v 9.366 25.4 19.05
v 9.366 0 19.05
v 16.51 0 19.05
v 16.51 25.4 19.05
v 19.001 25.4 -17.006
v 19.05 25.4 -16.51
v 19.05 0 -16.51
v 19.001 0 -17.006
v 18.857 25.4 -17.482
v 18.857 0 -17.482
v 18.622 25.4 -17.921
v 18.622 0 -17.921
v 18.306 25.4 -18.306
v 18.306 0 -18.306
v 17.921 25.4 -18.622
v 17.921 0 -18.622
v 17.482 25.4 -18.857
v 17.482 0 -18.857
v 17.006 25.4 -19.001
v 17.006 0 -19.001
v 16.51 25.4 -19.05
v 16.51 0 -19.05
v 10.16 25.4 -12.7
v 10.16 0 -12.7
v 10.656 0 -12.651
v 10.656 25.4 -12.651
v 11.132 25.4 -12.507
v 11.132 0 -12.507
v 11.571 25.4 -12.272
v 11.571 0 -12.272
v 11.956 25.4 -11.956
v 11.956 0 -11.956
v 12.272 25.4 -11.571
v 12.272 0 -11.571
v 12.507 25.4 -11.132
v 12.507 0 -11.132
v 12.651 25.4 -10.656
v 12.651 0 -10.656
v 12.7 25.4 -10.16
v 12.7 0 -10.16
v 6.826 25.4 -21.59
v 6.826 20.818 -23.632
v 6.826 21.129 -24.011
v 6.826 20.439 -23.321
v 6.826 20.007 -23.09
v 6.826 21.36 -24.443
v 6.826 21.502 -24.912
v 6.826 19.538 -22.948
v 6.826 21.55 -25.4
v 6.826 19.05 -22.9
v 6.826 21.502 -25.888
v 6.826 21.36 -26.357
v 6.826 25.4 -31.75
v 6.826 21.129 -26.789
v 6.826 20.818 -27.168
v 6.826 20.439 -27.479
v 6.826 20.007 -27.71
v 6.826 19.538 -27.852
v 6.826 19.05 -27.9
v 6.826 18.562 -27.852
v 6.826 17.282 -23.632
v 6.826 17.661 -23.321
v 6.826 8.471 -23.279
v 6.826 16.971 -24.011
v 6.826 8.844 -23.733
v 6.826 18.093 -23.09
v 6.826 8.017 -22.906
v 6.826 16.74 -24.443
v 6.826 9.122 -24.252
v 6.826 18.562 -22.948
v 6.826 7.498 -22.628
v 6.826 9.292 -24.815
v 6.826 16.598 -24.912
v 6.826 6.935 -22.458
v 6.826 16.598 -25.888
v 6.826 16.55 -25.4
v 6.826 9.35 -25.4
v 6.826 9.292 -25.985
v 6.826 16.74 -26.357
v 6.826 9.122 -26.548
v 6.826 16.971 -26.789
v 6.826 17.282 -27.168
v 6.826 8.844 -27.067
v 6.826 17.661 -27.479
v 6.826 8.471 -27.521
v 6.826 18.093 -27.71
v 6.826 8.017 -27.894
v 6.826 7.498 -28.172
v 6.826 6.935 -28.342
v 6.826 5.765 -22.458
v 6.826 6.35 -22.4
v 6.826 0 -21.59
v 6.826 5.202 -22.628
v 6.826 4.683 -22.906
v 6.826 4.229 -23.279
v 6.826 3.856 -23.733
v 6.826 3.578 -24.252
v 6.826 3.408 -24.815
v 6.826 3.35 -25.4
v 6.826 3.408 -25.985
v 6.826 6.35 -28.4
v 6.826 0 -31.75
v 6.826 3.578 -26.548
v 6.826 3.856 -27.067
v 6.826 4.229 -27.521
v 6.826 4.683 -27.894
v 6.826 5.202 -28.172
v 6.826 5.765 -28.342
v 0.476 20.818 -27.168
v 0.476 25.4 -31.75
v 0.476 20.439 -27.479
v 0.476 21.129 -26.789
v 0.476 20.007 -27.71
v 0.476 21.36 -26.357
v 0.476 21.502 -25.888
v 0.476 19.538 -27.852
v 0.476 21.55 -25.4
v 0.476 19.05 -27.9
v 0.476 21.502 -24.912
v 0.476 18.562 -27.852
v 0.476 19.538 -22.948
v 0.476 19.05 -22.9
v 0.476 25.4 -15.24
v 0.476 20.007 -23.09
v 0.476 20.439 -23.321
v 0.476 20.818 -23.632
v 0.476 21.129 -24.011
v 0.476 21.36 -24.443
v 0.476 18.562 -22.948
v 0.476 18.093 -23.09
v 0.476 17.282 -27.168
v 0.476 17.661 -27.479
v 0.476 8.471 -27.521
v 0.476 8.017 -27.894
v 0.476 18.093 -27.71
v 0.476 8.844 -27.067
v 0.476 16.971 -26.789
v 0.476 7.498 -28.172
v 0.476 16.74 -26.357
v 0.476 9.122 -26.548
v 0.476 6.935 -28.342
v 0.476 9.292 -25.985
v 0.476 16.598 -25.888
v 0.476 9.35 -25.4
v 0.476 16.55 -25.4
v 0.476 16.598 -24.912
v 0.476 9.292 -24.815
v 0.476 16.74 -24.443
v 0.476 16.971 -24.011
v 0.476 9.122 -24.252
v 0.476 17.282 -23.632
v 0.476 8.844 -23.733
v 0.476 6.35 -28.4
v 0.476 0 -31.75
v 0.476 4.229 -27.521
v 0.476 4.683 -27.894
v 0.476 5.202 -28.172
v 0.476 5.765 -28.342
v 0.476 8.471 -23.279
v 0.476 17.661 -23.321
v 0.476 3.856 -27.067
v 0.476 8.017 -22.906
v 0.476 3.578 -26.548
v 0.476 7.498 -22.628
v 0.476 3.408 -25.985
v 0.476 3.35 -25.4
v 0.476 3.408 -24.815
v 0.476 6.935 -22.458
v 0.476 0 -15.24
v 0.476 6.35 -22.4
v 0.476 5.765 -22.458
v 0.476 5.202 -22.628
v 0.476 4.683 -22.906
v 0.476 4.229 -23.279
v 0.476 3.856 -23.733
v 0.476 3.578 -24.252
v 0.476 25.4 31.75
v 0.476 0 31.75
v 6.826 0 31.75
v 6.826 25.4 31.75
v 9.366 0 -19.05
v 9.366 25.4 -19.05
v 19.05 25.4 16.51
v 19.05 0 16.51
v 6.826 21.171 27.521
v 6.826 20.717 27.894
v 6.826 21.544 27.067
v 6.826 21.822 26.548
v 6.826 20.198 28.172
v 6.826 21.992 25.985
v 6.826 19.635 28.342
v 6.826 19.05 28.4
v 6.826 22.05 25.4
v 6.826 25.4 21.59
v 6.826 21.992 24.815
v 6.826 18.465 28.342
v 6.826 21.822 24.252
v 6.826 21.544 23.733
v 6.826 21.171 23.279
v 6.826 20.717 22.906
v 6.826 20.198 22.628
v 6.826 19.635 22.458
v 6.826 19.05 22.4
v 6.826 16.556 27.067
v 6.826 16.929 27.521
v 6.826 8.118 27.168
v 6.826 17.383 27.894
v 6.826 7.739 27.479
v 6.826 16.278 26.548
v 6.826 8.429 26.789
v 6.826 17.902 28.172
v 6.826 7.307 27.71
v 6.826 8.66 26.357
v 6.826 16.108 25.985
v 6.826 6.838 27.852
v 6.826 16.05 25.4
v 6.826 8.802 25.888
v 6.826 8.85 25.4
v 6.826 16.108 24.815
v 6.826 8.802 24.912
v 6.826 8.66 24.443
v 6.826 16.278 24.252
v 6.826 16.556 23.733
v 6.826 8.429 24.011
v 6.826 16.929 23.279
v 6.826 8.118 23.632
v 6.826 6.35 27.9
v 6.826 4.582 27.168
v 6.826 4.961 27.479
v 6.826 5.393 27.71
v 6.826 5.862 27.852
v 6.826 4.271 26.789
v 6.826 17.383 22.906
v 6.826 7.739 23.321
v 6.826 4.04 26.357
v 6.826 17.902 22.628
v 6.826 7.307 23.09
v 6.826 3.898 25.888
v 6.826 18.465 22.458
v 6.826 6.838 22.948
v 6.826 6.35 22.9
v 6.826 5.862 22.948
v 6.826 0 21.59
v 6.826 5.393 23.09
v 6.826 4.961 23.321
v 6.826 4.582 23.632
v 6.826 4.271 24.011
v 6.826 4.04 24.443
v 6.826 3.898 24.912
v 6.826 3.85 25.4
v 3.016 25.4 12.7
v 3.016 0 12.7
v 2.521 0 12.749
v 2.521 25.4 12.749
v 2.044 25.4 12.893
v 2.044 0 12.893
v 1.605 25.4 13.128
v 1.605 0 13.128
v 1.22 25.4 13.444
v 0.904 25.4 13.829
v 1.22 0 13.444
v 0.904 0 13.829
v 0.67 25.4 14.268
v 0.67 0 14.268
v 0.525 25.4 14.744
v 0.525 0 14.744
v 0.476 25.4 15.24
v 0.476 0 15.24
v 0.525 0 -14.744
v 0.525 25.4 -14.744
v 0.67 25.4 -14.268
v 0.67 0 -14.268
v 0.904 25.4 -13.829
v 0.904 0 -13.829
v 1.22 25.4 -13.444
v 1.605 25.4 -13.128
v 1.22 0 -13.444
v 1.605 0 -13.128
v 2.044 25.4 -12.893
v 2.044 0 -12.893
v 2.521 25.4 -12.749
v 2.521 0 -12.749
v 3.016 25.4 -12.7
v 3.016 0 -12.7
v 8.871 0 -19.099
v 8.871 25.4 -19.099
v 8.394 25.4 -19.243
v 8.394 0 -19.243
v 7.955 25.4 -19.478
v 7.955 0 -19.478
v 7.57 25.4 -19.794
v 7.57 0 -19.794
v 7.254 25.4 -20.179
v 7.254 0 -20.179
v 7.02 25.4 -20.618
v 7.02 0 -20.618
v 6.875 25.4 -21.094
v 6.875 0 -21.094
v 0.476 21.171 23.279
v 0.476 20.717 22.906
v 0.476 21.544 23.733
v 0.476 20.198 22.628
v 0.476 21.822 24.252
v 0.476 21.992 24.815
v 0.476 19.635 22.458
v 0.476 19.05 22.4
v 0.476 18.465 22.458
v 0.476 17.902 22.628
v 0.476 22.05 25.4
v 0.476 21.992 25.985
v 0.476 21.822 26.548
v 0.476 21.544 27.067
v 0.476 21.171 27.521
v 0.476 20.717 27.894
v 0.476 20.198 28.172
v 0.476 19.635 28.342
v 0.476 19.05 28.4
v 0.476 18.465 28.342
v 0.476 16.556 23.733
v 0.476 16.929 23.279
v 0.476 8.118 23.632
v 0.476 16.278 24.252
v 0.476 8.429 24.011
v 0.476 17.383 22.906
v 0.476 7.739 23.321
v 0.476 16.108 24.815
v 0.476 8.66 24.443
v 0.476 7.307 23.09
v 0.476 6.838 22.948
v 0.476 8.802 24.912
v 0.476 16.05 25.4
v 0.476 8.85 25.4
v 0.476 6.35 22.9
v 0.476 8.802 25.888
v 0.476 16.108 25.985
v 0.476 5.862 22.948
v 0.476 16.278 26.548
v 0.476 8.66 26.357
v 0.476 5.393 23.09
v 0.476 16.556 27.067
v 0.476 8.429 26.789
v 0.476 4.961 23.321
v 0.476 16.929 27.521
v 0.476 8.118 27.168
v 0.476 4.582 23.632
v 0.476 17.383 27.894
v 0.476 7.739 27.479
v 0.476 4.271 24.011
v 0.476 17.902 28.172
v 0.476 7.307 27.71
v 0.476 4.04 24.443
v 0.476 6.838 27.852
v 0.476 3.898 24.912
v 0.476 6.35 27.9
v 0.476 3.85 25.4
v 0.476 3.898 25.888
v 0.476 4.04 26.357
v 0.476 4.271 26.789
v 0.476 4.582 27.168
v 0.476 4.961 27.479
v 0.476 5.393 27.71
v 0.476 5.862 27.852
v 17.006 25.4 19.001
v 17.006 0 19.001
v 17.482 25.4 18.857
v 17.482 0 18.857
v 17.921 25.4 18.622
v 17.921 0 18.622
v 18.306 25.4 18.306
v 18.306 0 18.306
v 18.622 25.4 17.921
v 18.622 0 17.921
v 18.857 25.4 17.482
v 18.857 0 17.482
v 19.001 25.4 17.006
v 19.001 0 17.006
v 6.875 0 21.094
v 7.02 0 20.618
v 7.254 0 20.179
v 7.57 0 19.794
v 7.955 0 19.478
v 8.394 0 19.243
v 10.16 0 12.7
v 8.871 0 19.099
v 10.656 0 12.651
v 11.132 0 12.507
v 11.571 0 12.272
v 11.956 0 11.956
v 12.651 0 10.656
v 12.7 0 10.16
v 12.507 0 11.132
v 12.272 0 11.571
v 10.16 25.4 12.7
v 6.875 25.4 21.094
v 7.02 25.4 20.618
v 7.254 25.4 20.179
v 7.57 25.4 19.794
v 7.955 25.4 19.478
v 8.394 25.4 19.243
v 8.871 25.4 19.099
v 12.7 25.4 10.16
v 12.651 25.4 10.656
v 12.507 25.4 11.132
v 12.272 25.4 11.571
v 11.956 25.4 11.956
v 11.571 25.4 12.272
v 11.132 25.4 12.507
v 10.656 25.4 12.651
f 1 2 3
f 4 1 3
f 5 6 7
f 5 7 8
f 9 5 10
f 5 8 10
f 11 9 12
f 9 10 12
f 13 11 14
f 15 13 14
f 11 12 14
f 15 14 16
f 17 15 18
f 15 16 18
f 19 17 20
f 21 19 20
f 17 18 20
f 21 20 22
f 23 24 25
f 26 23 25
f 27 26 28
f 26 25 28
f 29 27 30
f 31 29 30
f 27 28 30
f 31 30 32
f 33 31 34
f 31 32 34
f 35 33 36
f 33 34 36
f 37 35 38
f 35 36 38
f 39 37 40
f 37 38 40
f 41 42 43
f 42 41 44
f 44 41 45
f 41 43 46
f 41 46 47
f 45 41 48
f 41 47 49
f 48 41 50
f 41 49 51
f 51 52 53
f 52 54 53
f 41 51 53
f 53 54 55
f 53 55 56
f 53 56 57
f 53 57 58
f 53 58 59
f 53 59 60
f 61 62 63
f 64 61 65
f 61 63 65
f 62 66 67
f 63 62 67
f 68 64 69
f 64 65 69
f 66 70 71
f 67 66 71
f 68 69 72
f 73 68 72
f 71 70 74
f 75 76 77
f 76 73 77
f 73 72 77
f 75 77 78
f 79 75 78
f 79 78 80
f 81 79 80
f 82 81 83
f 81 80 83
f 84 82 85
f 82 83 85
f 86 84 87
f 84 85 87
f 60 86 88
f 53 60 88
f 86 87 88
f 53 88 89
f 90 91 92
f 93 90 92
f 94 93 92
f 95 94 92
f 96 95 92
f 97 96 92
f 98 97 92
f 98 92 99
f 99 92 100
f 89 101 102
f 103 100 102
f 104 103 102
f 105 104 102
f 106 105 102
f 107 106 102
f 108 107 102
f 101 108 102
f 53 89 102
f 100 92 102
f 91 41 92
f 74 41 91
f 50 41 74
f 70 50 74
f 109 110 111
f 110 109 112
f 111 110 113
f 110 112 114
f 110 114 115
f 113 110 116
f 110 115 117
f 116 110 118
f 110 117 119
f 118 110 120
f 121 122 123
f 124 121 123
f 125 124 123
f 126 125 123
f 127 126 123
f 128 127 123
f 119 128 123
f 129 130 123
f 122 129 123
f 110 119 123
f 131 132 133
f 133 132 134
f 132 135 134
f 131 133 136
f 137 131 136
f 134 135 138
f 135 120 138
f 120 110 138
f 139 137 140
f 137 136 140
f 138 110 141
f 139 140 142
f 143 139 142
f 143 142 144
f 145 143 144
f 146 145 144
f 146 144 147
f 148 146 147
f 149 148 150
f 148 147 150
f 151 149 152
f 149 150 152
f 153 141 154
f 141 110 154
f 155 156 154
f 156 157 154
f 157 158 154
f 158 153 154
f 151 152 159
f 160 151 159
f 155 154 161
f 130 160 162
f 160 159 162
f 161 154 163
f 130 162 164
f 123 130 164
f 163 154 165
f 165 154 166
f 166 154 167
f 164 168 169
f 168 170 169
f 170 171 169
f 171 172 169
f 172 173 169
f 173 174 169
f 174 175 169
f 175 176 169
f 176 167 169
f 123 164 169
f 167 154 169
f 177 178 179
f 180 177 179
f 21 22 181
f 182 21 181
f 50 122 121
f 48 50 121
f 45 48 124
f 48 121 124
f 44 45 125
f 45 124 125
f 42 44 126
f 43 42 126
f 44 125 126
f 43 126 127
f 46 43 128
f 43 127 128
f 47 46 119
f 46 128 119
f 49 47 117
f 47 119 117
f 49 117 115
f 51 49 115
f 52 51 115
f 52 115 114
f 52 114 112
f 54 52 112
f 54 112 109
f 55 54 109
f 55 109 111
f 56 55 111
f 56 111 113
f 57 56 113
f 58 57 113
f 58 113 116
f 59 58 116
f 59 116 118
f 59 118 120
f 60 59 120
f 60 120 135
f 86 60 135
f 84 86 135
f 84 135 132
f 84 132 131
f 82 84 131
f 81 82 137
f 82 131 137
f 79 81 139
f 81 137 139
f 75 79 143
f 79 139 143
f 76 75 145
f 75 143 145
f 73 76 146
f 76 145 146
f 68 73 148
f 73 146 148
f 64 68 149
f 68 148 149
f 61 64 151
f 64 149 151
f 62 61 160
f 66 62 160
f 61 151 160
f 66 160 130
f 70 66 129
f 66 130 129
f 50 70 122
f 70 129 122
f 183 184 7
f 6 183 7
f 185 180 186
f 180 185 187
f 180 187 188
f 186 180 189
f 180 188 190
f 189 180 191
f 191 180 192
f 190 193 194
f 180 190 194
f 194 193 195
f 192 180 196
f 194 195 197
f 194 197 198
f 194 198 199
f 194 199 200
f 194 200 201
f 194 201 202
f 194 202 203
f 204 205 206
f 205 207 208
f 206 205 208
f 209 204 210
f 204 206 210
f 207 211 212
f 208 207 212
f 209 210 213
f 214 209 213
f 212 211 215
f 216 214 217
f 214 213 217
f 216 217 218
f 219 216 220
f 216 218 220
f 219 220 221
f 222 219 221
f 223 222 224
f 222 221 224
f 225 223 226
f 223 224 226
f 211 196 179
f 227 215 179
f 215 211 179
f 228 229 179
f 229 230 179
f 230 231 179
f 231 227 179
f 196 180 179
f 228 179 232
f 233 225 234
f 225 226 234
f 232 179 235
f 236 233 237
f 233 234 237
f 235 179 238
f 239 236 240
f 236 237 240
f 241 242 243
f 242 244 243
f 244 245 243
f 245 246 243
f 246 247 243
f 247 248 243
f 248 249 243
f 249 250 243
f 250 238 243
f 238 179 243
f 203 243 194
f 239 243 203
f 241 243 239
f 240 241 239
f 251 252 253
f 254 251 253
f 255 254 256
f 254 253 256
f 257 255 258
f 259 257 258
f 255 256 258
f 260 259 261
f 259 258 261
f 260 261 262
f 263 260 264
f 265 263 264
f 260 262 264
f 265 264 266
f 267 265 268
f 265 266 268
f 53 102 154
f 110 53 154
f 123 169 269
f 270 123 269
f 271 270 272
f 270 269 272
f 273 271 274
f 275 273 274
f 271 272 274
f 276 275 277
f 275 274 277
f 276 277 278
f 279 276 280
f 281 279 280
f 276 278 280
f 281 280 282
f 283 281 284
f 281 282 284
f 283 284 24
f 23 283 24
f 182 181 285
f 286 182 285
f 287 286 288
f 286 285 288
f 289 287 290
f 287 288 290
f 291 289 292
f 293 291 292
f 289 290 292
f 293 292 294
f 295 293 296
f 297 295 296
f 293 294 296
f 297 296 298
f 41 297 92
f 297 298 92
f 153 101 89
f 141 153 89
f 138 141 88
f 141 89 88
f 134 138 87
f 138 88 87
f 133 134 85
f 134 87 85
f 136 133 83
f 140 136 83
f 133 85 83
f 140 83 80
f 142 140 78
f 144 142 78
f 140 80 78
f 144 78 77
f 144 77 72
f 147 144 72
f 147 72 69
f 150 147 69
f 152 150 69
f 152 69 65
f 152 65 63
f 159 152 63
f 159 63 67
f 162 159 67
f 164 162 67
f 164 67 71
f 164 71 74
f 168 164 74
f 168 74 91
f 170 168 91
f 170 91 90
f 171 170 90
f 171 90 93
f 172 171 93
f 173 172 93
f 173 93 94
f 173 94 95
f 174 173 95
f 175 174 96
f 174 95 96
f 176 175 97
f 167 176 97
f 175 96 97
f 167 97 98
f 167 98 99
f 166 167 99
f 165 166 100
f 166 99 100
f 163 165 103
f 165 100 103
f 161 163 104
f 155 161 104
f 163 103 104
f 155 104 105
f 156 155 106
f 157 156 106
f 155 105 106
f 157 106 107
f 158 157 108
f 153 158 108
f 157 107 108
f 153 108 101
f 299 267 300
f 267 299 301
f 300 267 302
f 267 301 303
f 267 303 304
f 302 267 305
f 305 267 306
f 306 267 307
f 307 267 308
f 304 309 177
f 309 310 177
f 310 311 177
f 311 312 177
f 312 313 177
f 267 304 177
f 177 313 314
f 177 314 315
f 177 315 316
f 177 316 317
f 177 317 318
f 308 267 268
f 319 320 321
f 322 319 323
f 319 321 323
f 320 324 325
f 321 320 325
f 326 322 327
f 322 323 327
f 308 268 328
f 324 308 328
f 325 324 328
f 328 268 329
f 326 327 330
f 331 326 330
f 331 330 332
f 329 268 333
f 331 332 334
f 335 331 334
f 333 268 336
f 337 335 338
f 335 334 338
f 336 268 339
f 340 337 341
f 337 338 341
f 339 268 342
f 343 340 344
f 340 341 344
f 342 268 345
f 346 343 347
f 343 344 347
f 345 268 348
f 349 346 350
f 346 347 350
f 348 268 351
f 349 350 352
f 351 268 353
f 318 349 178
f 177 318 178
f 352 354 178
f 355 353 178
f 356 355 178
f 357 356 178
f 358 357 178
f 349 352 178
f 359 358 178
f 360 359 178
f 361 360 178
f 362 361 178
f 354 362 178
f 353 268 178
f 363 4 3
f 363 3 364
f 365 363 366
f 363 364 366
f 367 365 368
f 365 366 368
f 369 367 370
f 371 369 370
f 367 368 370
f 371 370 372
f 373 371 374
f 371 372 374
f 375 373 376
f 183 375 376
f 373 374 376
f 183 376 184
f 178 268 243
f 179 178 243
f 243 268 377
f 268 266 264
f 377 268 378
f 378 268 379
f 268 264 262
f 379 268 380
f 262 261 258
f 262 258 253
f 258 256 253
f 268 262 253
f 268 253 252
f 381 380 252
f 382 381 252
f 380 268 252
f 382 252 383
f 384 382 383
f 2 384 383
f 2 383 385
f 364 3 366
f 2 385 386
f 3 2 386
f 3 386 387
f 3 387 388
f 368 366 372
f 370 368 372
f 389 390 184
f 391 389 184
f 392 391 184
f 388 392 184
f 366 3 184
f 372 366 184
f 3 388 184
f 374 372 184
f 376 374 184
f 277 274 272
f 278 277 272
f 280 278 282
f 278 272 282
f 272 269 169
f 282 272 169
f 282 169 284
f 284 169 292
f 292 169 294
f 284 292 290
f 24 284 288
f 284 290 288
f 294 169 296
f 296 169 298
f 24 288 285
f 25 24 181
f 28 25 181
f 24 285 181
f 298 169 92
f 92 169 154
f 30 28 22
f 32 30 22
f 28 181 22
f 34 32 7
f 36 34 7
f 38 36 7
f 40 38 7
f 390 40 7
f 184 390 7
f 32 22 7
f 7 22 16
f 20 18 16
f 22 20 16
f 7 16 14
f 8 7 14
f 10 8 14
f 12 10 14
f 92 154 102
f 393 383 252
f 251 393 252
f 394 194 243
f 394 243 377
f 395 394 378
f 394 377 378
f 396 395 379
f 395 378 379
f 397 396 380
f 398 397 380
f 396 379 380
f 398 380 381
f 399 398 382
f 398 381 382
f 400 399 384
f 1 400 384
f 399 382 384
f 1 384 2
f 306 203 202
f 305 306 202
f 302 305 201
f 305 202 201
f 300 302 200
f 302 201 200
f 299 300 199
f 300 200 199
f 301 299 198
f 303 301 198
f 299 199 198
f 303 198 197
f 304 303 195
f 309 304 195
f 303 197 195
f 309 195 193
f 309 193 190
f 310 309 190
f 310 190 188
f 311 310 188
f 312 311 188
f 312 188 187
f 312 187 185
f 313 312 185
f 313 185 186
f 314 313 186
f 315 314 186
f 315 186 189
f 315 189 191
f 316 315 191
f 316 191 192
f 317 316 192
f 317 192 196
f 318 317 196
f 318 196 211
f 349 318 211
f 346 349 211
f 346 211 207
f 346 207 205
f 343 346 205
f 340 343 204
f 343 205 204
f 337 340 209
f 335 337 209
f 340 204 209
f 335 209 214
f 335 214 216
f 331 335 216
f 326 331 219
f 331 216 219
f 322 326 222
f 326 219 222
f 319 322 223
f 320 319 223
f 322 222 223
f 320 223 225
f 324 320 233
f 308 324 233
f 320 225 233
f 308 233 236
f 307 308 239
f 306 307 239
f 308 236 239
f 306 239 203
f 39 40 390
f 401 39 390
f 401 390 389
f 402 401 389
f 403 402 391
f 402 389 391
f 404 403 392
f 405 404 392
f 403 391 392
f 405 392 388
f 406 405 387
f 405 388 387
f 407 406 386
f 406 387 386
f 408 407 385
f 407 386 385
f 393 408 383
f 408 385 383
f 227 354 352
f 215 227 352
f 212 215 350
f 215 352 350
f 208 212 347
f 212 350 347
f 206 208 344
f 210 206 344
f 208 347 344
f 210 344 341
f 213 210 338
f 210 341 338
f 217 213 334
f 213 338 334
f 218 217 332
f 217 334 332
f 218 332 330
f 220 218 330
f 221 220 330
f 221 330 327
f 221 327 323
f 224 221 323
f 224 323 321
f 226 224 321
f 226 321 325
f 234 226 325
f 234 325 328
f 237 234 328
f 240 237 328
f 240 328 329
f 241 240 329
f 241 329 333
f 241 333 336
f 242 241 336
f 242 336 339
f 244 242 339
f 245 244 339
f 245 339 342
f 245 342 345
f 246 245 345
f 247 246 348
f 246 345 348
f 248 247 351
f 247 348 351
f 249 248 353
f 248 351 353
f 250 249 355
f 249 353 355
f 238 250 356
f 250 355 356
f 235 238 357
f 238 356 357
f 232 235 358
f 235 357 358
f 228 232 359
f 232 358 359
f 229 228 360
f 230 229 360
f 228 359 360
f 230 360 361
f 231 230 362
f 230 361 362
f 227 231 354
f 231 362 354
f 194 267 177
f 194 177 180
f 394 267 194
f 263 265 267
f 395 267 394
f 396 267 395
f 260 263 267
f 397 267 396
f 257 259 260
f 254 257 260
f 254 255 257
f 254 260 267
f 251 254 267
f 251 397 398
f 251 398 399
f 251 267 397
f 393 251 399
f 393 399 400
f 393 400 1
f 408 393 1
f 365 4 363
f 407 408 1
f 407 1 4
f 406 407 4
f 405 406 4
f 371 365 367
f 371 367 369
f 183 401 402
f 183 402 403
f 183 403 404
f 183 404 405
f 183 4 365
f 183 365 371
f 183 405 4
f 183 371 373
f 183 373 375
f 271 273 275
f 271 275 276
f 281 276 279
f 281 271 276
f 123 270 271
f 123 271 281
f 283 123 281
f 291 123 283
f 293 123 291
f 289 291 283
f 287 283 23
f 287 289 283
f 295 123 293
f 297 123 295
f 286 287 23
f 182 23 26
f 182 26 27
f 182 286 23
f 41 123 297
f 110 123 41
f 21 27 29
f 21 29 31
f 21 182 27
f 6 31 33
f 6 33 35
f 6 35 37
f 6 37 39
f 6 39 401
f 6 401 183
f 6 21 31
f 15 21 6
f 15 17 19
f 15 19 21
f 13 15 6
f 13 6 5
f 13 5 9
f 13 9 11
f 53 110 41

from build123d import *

# Parameters (mm, degrees)
BOSS_EXTRUDE2_DEPTH   = 25.4
CUT_EXTRUDE1_REACH    = 44.458
SKETCH2_R             = 3
M6X1_0_TAPPED_HOLE1_D = 5


with BuildPart() as part:
    # Sketch1 → Boss-Extrude2 (new body)
    with BuildSketch(Plane(origin=(0, 0, 0), x_dir=(1, 0, 0), z_dir=(0, 1, 0))):
        with BuildLine():
            Line((0.47625, 31.75), (0.47625, 15.24))
            ThreePointArc((0.47625, 15.24), (1.220198776, 13.443948776), (3.01625, 12.7))
            Line((3.01625, 12.7), (10.16, 12.7))
            ThreePointArc((10.16, 12.7), (11.956051224, 11.956051224), (12.7, 10.16))
            Line((12.7, 10.16), (12.7, -10.16))
            ThreePointArc((12.7, -10.16), (11.956051224, -11.956051224), (10.16, -12.7))
            Line((10.16, -12.7), (3.01625, -12.7))
            ThreePointArc((3.01625, -12.7), (1.220198776, -13.443948776), (0.47625, -15.24))
            Line((0.47625, -15.24), (0.47625, -31.75))
            Line((0.47625, -31.75), (6.82625, -31.75))
            Line((6.82625, -31.75), (6.82625, -21.59))
            ThreePointArc((6.82625, -21.59), (7.570198776, -19.793948776), (9.36625, -19.05))
            Line((9.36625, -19.05), (16.51, -19.05))
            ThreePointArc((16.51, -19.05), (18.306051224, -18.306051224), (19.05, -16.51))
            Line((19.05, -16.51), (19.05, 16.51))
            ThreePointArc((19.05, 16.51), (18.306051224, 18.306051224), (16.51, 19.05))
            Line((16.51, 19.05), (9.36625, 19.05))
            ThreePointArc((9.36625, 19.05), (7.570198776, 19.793948776), (6.82625, 21.59))
            Line((6.82625, 21.59), (6.82625, 31.75))
            Line((6.82625, 31.75), (0.47625, 31.75))
        make_face()
    extrude(amount=BOSS_EXTRUDE2_DEPTH)

    # Sketch2 → Cut-Extrude1 (cut, up to next)
    with BuildSketch(Plane(origin=(6.82625, 0, 0), x_dir=(0, 0, -1), z_dir=(1, 0, 0)), mode=Mode.PRIVATE) as cut_extrude1_sk1:
        with Locations((-25.4, 19.05)):
            Circle(SKETCH2_R)
    cut_extrude1_tool1 = extrude(cut_extrude1_sk1.sketch, amount=-CUT_EXTRUDE1_REACH, mode=Mode.PRIVATE) & part.part
    # Sketch2 → Cut-Extrude1 (cut, up to next)
    with BuildSketch(Plane(origin=(6.82625, 0, 0), x_dir=(0, 0, -1), z_dir=(1, 0, 0)), mode=Mode.PRIVATE) as cut_extrude1_sk2:
        with Locations((25.4, 6.35)):
            Circle(SKETCH2_R)
    cut_extrude1_tool2 = extrude(cut_extrude1_sk2.sketch, amount=-CUT_EXTRUDE1_REACH, mode=Mode.PRIVATE) & part.part
    add(cut_extrude1_tool1.solids().sort_by_distance((6.82625, 19.05, 25.4))[0], mode=Mode.SUBTRACT)
    add(cut_extrude1_tool2.solids().sort_by_distance((6.82625, 6.35, -25.4))[0], mode=Mode.SUBTRACT)

    # M6x1.0 Tapped Hole1 (through all)
    with Locations(Plane(origin=(6.82625, 0, 0), x_dir=(0, 0, -1), z_dir=(1, 0, 0))):
        with Locations((-25.4, 6.35), (25.4, 19.05)):
            Hole(M6X1_0_TAPPED_HOLE1_D / 2)


solid = part.part
